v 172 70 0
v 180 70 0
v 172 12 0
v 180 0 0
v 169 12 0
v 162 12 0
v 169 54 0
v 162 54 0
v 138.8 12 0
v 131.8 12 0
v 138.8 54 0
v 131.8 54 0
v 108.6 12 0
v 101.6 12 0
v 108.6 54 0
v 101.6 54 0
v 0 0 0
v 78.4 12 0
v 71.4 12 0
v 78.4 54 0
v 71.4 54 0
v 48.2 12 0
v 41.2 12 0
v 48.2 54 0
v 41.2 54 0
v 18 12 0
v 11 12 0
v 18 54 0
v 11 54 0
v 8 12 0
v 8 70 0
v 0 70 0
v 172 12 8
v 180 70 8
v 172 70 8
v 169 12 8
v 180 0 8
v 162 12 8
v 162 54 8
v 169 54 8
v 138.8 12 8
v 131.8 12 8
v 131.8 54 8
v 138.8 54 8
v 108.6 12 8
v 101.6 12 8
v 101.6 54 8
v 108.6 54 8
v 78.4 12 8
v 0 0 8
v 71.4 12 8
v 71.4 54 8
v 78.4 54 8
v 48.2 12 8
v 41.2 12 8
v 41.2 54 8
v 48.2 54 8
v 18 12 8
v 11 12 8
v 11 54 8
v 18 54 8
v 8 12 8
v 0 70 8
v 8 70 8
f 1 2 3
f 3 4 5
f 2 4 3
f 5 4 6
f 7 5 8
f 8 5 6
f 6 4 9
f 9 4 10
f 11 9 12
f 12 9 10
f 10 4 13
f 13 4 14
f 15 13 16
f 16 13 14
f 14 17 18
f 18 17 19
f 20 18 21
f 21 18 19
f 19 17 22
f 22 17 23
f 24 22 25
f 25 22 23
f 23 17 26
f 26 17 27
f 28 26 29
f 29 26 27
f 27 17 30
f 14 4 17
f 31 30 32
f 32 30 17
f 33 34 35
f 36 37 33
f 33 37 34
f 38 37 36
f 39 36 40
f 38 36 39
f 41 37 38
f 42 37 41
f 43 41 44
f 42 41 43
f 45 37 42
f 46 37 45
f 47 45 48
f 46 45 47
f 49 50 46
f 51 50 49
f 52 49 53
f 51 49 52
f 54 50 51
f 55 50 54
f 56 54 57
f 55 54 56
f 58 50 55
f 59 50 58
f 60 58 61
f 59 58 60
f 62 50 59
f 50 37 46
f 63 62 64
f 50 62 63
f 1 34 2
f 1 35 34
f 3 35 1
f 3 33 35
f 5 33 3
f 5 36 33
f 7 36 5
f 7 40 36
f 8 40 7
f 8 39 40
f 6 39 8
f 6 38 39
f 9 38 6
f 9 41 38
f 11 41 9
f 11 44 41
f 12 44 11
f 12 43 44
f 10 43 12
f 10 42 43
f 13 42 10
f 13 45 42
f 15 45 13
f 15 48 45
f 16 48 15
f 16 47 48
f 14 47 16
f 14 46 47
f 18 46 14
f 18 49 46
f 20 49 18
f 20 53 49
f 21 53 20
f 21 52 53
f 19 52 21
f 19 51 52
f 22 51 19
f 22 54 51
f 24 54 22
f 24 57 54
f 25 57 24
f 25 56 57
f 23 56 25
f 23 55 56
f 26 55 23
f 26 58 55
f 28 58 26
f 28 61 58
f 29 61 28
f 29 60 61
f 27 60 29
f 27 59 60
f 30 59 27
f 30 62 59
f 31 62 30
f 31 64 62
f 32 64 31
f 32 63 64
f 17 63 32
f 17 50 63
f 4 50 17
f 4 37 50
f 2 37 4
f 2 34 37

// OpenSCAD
$fn = 32;

// ----------------------------------------------------------------------
// Guard grille: 6 slats over a 180 x 70 mm plate
// ----------------------------------------------------------------------

// --- parameters (mm) ---
profile_height = 8;       // extrusion height
profile_points = 32;      // points of the closed outline

profile = [[0, 0], [180, 0], [180, 70], [172, 70], [172, 12], [169, 12], [169, 54], [162, 54], [162, 12], [138.8, 12], [138.8, 54], [131.8, 54], [131.8, 12], [108.6, 12], [108.6, 54], [101.6, 54], [101.6, 12], [78.4, 12], [78.4, 54], [71.4, 54], [71.4, 12], [48.2, 12], [48.2, 54], [41.2, 54], [41.2, 12], [18, 12], [18, 54], [11, 54], [11, 12], [8, 12], [8, 70], [0, 70]];  // single closed polygon, 32 points, counter clockwise

// --- the one profile operation ---
linear_extrude(height = profile_height) polygon(points = profile);
